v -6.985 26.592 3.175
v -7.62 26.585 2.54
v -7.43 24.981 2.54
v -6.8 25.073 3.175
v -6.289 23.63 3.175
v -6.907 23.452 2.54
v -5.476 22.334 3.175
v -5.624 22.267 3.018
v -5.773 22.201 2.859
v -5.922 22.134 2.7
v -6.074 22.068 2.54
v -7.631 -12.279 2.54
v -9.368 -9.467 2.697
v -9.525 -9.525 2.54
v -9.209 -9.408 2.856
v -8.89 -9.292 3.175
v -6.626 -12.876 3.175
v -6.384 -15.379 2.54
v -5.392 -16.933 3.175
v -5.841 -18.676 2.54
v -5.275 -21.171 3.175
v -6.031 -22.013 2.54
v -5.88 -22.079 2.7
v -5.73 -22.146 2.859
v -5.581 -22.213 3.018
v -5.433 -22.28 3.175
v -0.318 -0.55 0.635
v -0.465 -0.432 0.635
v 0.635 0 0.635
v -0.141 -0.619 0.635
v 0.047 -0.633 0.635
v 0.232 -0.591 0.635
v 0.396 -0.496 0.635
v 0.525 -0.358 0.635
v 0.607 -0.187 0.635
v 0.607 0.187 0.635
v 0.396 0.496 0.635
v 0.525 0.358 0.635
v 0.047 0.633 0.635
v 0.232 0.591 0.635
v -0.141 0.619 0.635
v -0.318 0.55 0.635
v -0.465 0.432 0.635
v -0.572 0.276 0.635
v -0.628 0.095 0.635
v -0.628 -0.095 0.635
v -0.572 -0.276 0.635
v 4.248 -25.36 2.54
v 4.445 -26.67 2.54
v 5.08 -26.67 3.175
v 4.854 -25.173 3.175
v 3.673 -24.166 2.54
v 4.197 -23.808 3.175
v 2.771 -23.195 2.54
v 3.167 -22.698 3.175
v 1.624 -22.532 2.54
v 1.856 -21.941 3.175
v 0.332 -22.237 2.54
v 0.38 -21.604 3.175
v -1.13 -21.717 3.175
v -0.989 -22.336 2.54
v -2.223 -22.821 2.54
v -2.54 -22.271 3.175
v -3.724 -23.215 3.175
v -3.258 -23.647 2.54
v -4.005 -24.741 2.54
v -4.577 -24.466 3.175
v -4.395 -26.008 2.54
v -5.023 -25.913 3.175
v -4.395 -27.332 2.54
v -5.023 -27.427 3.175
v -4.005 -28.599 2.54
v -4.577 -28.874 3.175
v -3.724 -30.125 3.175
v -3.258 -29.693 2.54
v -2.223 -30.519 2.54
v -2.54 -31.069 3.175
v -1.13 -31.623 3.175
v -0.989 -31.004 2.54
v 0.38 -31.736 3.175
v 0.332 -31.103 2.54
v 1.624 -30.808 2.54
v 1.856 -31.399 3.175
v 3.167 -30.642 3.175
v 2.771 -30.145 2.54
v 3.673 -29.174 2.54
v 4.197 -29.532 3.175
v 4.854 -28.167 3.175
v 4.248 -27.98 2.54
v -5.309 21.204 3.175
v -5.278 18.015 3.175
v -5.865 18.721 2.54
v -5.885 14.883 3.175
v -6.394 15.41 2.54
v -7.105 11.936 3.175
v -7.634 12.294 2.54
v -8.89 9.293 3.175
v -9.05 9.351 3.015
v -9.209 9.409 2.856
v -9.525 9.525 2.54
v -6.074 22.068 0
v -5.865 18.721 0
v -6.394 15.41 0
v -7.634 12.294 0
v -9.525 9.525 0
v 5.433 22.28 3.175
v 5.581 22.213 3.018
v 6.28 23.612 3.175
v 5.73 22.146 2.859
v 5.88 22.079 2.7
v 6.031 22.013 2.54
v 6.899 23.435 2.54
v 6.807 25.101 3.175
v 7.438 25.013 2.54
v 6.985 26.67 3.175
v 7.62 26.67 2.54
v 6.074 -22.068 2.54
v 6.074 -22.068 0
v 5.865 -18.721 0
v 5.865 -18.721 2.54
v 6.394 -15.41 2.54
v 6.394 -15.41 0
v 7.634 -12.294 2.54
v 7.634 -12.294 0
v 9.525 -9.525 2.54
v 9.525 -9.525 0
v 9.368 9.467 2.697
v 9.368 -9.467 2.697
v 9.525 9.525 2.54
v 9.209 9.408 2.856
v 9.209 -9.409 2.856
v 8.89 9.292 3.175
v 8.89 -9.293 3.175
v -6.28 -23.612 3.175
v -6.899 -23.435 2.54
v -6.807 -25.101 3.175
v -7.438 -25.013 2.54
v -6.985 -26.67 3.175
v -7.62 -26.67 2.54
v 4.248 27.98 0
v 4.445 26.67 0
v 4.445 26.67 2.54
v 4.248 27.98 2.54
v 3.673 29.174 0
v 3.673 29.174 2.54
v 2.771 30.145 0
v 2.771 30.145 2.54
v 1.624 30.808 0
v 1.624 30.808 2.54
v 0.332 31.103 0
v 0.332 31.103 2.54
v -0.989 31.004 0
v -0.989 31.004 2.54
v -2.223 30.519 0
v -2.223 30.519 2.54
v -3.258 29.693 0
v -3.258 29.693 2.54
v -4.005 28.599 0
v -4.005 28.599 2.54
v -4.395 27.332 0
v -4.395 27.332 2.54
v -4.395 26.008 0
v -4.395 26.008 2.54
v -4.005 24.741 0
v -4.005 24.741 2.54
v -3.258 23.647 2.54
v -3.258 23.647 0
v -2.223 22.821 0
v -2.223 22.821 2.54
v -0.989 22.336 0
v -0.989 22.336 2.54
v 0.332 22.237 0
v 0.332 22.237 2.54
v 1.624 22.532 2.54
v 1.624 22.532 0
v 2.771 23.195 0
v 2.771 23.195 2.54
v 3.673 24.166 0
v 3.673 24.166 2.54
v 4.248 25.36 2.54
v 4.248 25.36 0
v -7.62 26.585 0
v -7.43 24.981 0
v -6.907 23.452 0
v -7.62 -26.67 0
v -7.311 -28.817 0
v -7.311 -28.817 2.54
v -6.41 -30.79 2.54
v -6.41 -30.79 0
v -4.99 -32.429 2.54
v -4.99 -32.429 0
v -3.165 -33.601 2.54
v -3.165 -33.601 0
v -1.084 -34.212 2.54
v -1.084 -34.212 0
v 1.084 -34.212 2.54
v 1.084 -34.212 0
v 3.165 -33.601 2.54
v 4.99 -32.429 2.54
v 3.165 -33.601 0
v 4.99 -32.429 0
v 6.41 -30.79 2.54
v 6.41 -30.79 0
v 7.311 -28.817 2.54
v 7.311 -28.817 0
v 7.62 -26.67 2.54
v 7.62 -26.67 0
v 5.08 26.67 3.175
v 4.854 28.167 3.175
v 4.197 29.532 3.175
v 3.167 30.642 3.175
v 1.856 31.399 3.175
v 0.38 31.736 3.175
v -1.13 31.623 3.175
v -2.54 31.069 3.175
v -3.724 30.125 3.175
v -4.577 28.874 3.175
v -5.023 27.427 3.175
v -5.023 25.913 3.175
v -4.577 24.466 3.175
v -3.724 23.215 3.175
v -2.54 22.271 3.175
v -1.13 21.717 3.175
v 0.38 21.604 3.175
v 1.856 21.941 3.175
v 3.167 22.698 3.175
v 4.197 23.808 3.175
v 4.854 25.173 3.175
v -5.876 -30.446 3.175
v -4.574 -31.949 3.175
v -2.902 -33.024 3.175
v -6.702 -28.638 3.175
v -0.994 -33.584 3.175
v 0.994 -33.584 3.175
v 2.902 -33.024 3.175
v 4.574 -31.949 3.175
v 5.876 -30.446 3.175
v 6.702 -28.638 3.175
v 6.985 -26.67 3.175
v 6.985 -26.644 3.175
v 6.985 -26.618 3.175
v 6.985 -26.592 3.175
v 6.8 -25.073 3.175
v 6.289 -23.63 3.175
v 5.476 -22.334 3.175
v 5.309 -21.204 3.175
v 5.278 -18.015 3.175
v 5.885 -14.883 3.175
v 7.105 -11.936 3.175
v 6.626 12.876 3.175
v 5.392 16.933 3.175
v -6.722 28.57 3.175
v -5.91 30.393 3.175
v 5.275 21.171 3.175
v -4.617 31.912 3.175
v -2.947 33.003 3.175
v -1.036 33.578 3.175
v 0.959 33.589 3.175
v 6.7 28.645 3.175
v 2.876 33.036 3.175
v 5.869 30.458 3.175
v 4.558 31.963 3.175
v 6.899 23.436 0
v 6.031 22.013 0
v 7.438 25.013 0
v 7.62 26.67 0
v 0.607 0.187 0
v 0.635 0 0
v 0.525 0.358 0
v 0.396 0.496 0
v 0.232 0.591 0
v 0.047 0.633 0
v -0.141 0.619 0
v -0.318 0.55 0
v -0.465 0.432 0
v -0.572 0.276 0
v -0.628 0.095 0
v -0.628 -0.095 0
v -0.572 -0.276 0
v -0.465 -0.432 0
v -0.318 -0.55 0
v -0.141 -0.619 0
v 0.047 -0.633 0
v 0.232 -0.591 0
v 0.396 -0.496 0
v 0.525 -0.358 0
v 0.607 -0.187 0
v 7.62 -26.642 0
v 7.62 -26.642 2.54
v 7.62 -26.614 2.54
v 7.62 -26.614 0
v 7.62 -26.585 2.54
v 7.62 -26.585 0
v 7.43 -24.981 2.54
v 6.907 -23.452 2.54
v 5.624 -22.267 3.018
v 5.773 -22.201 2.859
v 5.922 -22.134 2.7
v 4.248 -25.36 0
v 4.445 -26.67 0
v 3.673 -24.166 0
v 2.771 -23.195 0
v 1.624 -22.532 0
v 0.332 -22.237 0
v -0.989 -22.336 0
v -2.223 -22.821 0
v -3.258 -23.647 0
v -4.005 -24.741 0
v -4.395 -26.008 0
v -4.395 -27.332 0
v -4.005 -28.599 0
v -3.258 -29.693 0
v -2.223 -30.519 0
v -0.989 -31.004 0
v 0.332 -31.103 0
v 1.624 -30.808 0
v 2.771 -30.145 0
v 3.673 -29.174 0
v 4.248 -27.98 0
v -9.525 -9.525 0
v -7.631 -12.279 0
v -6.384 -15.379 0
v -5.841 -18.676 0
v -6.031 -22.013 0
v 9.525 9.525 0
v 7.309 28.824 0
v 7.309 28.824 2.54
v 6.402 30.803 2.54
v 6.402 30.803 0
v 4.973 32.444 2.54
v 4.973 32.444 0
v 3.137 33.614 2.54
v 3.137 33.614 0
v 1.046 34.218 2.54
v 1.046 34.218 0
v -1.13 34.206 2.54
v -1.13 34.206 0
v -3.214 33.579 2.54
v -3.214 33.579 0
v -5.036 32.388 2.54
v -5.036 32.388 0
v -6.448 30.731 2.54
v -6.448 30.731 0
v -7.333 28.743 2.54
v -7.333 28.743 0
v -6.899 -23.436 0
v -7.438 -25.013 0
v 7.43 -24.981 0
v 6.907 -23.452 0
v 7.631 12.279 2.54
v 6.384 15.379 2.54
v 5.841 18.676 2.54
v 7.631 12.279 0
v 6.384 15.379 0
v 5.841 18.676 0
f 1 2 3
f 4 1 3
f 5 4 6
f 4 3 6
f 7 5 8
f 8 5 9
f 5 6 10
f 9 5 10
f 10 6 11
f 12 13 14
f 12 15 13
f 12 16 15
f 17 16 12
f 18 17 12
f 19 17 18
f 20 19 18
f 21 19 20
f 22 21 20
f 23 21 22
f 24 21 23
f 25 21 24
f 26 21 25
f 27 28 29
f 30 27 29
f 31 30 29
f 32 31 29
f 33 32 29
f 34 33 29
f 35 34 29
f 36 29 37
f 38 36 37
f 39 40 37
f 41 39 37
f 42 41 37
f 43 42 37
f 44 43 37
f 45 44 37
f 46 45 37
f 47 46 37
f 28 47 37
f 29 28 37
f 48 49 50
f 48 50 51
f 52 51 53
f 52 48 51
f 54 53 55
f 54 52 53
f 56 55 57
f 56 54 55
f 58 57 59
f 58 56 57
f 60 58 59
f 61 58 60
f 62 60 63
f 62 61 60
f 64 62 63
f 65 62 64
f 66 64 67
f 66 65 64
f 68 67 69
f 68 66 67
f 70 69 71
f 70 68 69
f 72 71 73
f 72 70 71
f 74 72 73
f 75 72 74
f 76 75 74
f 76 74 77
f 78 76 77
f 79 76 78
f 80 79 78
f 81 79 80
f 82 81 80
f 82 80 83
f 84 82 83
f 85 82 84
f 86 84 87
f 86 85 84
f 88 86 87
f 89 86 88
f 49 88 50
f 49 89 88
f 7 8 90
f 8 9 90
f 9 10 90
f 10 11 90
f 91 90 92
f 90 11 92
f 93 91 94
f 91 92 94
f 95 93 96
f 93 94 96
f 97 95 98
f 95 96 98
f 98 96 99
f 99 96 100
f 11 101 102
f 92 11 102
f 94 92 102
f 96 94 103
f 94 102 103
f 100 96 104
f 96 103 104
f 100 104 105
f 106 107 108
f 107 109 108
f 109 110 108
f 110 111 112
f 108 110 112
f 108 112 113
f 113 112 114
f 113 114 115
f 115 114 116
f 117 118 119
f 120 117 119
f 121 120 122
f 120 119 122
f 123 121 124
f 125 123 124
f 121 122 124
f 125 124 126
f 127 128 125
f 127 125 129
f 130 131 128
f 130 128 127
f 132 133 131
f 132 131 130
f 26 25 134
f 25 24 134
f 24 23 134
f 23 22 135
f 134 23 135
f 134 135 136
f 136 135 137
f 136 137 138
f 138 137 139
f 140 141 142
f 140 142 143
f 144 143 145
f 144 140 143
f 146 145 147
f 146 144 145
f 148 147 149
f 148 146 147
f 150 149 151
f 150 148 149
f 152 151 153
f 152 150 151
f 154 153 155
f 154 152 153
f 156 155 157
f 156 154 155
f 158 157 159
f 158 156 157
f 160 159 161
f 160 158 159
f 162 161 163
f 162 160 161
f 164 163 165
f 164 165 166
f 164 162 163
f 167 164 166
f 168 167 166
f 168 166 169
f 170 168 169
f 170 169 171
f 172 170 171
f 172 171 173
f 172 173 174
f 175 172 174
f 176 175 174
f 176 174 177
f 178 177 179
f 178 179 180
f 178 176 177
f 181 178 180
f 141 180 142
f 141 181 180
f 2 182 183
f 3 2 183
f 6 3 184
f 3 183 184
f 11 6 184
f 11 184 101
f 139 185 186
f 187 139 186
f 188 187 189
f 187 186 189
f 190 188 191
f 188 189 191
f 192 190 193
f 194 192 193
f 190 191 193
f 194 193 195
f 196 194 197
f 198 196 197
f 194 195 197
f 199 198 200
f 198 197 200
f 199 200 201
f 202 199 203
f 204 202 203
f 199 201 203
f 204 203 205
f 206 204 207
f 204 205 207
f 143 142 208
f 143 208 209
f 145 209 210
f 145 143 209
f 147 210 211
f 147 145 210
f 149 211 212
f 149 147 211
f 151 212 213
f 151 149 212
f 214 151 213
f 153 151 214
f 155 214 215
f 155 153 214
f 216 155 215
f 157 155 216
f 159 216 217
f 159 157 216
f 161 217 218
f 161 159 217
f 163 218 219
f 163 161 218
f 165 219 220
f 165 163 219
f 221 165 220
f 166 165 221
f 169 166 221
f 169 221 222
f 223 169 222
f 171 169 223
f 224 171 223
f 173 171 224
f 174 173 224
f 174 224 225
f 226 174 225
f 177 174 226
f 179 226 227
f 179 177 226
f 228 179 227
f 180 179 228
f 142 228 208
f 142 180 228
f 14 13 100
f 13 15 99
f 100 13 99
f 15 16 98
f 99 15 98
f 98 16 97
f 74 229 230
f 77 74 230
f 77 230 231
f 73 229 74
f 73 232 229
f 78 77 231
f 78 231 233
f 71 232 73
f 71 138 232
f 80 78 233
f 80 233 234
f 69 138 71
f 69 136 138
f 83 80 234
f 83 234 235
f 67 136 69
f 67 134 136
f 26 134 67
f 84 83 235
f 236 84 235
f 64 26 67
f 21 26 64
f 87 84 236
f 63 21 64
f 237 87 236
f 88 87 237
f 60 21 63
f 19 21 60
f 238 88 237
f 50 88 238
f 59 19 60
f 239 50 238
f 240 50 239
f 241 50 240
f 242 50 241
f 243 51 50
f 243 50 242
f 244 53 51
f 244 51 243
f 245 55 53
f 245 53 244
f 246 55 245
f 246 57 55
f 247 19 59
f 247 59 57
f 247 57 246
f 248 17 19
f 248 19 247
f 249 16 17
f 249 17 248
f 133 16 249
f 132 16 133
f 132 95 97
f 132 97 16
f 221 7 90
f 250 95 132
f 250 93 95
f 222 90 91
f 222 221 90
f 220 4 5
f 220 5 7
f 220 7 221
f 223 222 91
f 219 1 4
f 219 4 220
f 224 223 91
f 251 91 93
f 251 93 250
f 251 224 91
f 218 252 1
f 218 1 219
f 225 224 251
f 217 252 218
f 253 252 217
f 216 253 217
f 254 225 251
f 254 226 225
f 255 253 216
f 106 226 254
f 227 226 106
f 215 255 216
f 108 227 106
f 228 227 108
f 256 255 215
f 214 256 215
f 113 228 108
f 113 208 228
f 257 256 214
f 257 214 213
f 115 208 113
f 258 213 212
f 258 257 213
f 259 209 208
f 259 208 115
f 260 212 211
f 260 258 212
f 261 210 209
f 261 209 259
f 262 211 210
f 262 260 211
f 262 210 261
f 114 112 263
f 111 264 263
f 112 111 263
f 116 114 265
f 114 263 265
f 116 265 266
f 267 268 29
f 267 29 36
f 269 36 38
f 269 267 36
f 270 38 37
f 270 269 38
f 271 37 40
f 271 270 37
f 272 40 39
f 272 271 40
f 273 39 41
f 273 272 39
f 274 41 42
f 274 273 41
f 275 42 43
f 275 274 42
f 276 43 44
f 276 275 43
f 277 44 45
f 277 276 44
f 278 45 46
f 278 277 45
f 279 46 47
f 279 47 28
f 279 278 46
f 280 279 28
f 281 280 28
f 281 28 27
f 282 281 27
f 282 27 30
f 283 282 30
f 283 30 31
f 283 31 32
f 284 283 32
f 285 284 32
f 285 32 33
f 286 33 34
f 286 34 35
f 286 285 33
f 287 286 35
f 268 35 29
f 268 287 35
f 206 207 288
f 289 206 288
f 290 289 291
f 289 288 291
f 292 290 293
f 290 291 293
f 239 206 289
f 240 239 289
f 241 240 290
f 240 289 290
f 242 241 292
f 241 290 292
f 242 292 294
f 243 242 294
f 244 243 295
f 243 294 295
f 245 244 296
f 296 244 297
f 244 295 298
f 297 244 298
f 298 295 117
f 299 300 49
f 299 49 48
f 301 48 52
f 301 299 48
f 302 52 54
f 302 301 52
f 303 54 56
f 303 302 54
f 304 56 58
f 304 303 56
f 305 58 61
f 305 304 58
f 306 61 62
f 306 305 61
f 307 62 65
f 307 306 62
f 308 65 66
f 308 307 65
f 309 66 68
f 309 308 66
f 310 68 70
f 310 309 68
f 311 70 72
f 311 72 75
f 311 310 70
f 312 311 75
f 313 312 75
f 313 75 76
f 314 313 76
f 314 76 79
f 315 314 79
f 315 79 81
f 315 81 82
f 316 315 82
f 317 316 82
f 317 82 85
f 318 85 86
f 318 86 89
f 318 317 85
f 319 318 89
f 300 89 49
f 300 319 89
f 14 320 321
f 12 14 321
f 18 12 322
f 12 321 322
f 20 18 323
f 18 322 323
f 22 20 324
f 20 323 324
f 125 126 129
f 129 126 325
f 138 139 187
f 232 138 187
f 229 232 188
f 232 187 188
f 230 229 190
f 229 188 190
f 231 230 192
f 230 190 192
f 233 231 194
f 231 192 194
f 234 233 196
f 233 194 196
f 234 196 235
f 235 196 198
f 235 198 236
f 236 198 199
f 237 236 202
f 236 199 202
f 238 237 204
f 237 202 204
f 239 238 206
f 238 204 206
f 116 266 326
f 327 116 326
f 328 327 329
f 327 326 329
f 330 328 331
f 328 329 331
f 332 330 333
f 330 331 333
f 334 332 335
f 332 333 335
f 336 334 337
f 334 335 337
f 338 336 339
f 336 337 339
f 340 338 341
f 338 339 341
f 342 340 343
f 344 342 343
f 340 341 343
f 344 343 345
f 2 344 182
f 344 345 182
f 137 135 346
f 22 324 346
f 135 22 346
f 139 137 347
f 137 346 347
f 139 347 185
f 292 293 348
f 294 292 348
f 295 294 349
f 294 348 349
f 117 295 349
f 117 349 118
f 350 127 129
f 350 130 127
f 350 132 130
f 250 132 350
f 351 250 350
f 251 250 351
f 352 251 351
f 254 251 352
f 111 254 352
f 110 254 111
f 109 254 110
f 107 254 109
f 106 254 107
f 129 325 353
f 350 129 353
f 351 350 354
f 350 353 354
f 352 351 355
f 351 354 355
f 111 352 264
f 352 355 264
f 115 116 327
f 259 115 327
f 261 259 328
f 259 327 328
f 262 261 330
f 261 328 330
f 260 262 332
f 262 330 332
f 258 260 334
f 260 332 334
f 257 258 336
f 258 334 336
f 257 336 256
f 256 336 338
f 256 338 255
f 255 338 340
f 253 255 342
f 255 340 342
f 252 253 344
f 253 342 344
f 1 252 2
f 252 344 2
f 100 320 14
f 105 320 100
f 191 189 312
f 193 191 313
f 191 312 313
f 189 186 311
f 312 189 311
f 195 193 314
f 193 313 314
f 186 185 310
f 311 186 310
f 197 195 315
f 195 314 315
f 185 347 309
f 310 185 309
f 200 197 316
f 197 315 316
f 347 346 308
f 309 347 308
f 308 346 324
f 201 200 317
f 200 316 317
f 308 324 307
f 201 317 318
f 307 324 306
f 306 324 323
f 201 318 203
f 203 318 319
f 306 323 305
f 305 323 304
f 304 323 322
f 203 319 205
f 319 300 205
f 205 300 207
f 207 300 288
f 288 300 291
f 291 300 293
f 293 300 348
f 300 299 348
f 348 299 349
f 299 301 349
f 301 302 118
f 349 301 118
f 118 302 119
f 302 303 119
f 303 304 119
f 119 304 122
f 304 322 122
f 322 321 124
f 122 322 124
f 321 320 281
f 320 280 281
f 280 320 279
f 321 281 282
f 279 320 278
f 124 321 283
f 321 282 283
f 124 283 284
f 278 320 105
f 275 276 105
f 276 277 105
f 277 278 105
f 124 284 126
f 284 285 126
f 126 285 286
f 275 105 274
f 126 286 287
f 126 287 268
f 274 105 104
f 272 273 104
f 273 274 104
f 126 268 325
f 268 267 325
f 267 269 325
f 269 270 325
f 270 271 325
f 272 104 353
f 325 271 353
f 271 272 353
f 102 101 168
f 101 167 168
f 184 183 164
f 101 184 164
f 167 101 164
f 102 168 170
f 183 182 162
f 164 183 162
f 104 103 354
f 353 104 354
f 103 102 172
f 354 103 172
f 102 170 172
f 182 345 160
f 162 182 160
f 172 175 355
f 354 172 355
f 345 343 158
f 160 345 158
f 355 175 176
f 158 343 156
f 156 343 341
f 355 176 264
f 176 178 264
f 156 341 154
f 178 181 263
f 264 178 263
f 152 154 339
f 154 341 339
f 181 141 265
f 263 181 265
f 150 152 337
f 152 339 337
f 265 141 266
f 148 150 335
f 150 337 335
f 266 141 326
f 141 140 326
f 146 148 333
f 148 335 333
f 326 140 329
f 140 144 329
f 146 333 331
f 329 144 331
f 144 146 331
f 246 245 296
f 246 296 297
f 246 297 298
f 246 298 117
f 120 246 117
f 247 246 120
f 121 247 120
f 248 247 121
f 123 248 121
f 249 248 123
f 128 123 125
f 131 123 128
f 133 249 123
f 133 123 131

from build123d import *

# Parameters (mm, degrees)
F0_W        = 19.05
F0_H        = 19.05
F0_R        = 0.635
F0_R_2      = 4.445
F1_DEPTH    = 3.175
F2_C1_SIZE  = 0.635
F2_C2_SIZE  = 0.635
F2_C3_SIZE  = 0.635
F2_C4_SIZE  = 0.635
F2_C5_SIZE  = 0.635
F2_C6_SIZE  = 0.635
F2_C7_SIZE  = 0.635
F2_C8_SIZE  = 0.635
F2_C9_SIZE  = 0.6349
F2_C10_SIZE = 0.6349
F3_DEPTH    = 0.635


# Not quite as in the source:
# - a fillet or chamfer is up to 0.001 mm smaller than in the source, because OpenCascade refuses the exact size


with BuildPart() as f1:
    # F0 (on Top) → F1 (new body)
    with BuildSketch(Plane.XY):
        Rectangle(F0_W, F0_H)
        Circle(F0_R, mode=Mode.SUBTRACT)
        with BuildLine():
            Line((9.525, -9.525), (-9.525, -9.525))
            ThreePointArc((-9.525, -9.525), (-6.3836187271, -15.3786997104), (-6.0310725347, -22.012687032))
            ThreePointArc((-6.0310725347, -22.012687032), (0.0350329382, -19.0500805324), (6.0736411029, -22.0683390224))
            ThreePointArc((6.0736411029, -22.0683390224), (6.3936440411, -15.409890989), (9.525, -9.525))
        make_face()
        with BuildLine():
            ThreePointArc((6.0736411029, -22.0683390224), (0.0350329382, -19.0500805324), (-6.0310725347, -22.012687032))
            ThreePointArc((-6.0310725347, -22.012687032), (-6.6363180101, -24.4058987838), (-7.62, -26.67))
            ThreePointArc((-7.62, -26.67), (0, -34.29), (7.62, -26.67))
            ThreePointArc((7.62, -26.67), (7.619882327, -26.6276523681), (7.6195293118, -26.5853060441))
            ThreePointArc((7.6195293118, -26.5853060441), (6.6686101992, -24.3877327559), (6.0736411029, -22.0683390224))
        make_face()
        with Locations((0, -26.67)):
            Circle(F0_R_2, mode=Mode.SUBTRACT)
        with BuildLine():
            ThreePointArc((-7.62, -26.67), (-6.6363180101, -24.4058987838), (-6.0310725347, -22.012687032))
            ThreePointArc((-6.0310725347, -22.012687032), (-7.2118365454, -24.2095501137), (-7.62, -26.67))
        make_face()
        with BuildLine():
            ThreePointArc((7.6195293118, -26.5853060441), (7.2094713239, -24.202628275), (6.0736411029, -22.0683390224))
            ThreePointArc((6.0736411029, -22.0683390224), (6.6686101992, -24.3877327559), (7.6195293118, -26.5853060441))
        make_face()
        with BuildLine():
            ThreePointArc((-6.0736411029, 22.0683390224), (-6.3936440411, 15.409890989), (-9.525, 9.525))
            Line((-9.525, 9.525), (9.525, 9.525))
            ThreePointArc((9.525, 9.525), (6.3836187271, 15.3786997104), (6.0310725347, 22.012687032))
            ThreePointArc((6.0310725347, 22.012687032), (-0.0350329382, 19.0500805324), (-6.0736411029, 22.0683390224))
        make_face()
        with BuildLine():
            ThreePointArc((-7.6195293118, 26.5853060441), (-6.6686101992, 24.3877327559), (-6.0736411029, 22.0683390224))
            ThreePointArc((-6.0736411029, 22.0683390224), (-0.0350329382, 19.0500805324), (6.0310725347, 22.012687032))
            ThreePointArc((6.0310725347, 22.012687032), (6.6363180101, 24.4058987838), (7.62, 26.67))
            ThreePointArc((7.62, 26.67), (-0.0423476319, 34.289882327), (-7.6195293118, 26.5853060441))
        make_face()
        with Locations((0, 26.67)):
            Circle(F0_R_2, mode=Mode.SUBTRACT)
        with BuildLine():
            ThreePointArc((-7.6195293118, 26.5853060441), (-7.2094713239, 24.202628275), (-6.0736411029, 22.0683390224))
            ThreePointArc((-6.0736411029, 22.0683390224), (-6.6686101992, 24.3877327559), (-7.6195293118, 26.5853060441))
        make_face()
        with BuildLine():
            ThreePointArc((7.62, 26.67), (6.6363180101, 24.4058987838), (6.0310725347, 22.012687032))
            ThreePointArc((6.0310725347, 22.012687032), (7.2118365454, 24.2095501137), (7.62, 26.67))
        make_face()
        Circle(F0_R)
    extrude(amount=F1_DEPTH)

    # F2: chamfer of 0.635 on 10 edges, made by hand

    # F2_c1
    f2_c1_edges = [f1.edges().sort_by_distance(p)[0] for p in [
        (-9.525, 0, 3.175),
    ]]
    chamfer(f2_c1_edges, length=F2_C1_SIZE)

    # F2_c2
    f2_c2_edges = [f1.edges().sort_by_distance(p)[0] for p in [
        (-6.2554888364, -15.867774564, 3.175),
    ]]
    chamfer(f2_c2_edges, length=F2_C2_SIZE)

    # F2_c3
    f2_c3_edges = [f1.edges().sort_by_distance(p)[0] for p in [
        (6.3936440411, -15.409890989, 3.175),
    ]]
    chamfer(f2_c3_edges, length=F2_C3_SIZE)

    # F2_c4
    f2_c4_edges = [f1.edges().sort_by_distance(p)[0] for p in [
        (9.525, 0.4748240758, 3.175),
    ]]
    chamfer(f2_c4_edges, length=F2_C4_SIZE)

    # F2_c5
    f2_c5_edges = [f1.edges().sort_by_distance(p)[0] for p in [
        (6.2554888364, 15.867774564, 3.175),
    ]]
    chamfer(f2_c5_edges, length=F2_C5_SIZE)

    # F2_c6
    f2_c6_edges = [f1.edges().sort_by_distance(p)[0] for p in [
        (-6.2671958343, 15.9012829536, 3.175),
    ]]
    chamfer(f2_c6_edges, length=F2_C6_SIZE)

    # F2_c7
    f2_c7_edges = [f1.edges().sort_by_distance(p)[0] for p in [
        (-4.445, -26.67, 3.175),
    ]]
    chamfer(f2_c7_edges, length=F2_C7_SIZE)

    # F2_c8
    f2_c8_edges = [f1.edges().sort_by_distance(p)[0] for p in [
        (-4.445, 26.67, 3.175),
    ]]
    chamfer(f2_c8_edges, length=F2_C8_SIZE)

    # F2_c9 (size 0.635 in the source; OpenCascade refuses exactly that, so slightly less here)
    f2_c9_edges = [f1.edges().sort_by_distance(p)[0] for p in [
        (-0.0350329382, -34.2899194676, 3.175),
    ]]
    chamfer(f2_c9_edges, length=F2_C9_SIZE)

    # F2_c10 (size 0.635 in the source; OpenCascade refuses exactly that, so slightly less here)
    f2_c10_edges = [f1.edges().sort_by_distance(p)[0] for p in [
        (0.0350329382, 34.2899194676, 3.175),
    ]]
    chamfer(f2_c10_edges, length=F2_C10_SIZE)

    # F0 (on Top) → F3 (cut)
    with BuildSketch(Plane.XY):
        Circle(F0_R)
    extrude(amount=F3_DEPTH, mode=Mode.SUBTRACT)


solid = f1.part
